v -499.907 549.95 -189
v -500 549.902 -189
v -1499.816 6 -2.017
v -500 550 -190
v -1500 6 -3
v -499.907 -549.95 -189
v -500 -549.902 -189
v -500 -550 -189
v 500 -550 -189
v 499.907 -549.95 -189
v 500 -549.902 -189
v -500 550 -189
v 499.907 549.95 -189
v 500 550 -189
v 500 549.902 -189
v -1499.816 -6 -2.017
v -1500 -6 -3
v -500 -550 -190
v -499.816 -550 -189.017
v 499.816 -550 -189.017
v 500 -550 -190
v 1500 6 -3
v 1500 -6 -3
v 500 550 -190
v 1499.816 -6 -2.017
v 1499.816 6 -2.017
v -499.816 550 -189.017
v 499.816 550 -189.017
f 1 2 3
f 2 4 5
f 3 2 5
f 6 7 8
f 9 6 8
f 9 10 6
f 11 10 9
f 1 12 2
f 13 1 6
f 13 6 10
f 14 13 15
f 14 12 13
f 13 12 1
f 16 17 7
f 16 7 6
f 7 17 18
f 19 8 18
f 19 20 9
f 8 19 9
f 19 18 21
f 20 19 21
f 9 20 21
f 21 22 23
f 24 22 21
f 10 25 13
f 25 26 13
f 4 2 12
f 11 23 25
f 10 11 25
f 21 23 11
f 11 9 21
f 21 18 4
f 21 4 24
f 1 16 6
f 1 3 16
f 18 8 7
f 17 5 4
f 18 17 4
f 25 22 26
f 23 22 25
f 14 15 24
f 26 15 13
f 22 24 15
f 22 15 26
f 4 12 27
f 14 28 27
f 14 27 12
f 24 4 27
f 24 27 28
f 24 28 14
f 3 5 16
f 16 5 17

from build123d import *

# Parameters (mm, degrees)
SKETCH003_W  = 1000
SKETCH003_H  = 1100
PAD003_DEPTH = 1
PAD004_DEPTH = 1


with BuildPart() as part:
    # Sketch003 → Pad003 (new body)
    with BuildSketch(Plane.XY):
        Rectangle(SKETCH003_W, SKETCH003_H)
    extrude(amount=PAD003_DEPTH)

    # Sketch004 (on Local_CS) → Pad004 (join)
    with BuildSketch(Plane(origin=(-500, 0, 0), x_dir=(0.982961, 0, -0.183814), z_dir=(0.183814, 0, 0.982961))):
        Polygon((0, -550), (0, 550), (-1017.334262, 6), (-1017.334262, -6), align=None)
    pad004 = extrude(amount=PAD004_DEPTH)

    # Mirrored001: Pad004 across YZ
    add(pad004.mirror(Plane.YZ))


with BuildPart() as part_1:
    # Body002 placement: moved
    add(part.part.moved(Location((0, 0, -190))))


solid = part_1.part
